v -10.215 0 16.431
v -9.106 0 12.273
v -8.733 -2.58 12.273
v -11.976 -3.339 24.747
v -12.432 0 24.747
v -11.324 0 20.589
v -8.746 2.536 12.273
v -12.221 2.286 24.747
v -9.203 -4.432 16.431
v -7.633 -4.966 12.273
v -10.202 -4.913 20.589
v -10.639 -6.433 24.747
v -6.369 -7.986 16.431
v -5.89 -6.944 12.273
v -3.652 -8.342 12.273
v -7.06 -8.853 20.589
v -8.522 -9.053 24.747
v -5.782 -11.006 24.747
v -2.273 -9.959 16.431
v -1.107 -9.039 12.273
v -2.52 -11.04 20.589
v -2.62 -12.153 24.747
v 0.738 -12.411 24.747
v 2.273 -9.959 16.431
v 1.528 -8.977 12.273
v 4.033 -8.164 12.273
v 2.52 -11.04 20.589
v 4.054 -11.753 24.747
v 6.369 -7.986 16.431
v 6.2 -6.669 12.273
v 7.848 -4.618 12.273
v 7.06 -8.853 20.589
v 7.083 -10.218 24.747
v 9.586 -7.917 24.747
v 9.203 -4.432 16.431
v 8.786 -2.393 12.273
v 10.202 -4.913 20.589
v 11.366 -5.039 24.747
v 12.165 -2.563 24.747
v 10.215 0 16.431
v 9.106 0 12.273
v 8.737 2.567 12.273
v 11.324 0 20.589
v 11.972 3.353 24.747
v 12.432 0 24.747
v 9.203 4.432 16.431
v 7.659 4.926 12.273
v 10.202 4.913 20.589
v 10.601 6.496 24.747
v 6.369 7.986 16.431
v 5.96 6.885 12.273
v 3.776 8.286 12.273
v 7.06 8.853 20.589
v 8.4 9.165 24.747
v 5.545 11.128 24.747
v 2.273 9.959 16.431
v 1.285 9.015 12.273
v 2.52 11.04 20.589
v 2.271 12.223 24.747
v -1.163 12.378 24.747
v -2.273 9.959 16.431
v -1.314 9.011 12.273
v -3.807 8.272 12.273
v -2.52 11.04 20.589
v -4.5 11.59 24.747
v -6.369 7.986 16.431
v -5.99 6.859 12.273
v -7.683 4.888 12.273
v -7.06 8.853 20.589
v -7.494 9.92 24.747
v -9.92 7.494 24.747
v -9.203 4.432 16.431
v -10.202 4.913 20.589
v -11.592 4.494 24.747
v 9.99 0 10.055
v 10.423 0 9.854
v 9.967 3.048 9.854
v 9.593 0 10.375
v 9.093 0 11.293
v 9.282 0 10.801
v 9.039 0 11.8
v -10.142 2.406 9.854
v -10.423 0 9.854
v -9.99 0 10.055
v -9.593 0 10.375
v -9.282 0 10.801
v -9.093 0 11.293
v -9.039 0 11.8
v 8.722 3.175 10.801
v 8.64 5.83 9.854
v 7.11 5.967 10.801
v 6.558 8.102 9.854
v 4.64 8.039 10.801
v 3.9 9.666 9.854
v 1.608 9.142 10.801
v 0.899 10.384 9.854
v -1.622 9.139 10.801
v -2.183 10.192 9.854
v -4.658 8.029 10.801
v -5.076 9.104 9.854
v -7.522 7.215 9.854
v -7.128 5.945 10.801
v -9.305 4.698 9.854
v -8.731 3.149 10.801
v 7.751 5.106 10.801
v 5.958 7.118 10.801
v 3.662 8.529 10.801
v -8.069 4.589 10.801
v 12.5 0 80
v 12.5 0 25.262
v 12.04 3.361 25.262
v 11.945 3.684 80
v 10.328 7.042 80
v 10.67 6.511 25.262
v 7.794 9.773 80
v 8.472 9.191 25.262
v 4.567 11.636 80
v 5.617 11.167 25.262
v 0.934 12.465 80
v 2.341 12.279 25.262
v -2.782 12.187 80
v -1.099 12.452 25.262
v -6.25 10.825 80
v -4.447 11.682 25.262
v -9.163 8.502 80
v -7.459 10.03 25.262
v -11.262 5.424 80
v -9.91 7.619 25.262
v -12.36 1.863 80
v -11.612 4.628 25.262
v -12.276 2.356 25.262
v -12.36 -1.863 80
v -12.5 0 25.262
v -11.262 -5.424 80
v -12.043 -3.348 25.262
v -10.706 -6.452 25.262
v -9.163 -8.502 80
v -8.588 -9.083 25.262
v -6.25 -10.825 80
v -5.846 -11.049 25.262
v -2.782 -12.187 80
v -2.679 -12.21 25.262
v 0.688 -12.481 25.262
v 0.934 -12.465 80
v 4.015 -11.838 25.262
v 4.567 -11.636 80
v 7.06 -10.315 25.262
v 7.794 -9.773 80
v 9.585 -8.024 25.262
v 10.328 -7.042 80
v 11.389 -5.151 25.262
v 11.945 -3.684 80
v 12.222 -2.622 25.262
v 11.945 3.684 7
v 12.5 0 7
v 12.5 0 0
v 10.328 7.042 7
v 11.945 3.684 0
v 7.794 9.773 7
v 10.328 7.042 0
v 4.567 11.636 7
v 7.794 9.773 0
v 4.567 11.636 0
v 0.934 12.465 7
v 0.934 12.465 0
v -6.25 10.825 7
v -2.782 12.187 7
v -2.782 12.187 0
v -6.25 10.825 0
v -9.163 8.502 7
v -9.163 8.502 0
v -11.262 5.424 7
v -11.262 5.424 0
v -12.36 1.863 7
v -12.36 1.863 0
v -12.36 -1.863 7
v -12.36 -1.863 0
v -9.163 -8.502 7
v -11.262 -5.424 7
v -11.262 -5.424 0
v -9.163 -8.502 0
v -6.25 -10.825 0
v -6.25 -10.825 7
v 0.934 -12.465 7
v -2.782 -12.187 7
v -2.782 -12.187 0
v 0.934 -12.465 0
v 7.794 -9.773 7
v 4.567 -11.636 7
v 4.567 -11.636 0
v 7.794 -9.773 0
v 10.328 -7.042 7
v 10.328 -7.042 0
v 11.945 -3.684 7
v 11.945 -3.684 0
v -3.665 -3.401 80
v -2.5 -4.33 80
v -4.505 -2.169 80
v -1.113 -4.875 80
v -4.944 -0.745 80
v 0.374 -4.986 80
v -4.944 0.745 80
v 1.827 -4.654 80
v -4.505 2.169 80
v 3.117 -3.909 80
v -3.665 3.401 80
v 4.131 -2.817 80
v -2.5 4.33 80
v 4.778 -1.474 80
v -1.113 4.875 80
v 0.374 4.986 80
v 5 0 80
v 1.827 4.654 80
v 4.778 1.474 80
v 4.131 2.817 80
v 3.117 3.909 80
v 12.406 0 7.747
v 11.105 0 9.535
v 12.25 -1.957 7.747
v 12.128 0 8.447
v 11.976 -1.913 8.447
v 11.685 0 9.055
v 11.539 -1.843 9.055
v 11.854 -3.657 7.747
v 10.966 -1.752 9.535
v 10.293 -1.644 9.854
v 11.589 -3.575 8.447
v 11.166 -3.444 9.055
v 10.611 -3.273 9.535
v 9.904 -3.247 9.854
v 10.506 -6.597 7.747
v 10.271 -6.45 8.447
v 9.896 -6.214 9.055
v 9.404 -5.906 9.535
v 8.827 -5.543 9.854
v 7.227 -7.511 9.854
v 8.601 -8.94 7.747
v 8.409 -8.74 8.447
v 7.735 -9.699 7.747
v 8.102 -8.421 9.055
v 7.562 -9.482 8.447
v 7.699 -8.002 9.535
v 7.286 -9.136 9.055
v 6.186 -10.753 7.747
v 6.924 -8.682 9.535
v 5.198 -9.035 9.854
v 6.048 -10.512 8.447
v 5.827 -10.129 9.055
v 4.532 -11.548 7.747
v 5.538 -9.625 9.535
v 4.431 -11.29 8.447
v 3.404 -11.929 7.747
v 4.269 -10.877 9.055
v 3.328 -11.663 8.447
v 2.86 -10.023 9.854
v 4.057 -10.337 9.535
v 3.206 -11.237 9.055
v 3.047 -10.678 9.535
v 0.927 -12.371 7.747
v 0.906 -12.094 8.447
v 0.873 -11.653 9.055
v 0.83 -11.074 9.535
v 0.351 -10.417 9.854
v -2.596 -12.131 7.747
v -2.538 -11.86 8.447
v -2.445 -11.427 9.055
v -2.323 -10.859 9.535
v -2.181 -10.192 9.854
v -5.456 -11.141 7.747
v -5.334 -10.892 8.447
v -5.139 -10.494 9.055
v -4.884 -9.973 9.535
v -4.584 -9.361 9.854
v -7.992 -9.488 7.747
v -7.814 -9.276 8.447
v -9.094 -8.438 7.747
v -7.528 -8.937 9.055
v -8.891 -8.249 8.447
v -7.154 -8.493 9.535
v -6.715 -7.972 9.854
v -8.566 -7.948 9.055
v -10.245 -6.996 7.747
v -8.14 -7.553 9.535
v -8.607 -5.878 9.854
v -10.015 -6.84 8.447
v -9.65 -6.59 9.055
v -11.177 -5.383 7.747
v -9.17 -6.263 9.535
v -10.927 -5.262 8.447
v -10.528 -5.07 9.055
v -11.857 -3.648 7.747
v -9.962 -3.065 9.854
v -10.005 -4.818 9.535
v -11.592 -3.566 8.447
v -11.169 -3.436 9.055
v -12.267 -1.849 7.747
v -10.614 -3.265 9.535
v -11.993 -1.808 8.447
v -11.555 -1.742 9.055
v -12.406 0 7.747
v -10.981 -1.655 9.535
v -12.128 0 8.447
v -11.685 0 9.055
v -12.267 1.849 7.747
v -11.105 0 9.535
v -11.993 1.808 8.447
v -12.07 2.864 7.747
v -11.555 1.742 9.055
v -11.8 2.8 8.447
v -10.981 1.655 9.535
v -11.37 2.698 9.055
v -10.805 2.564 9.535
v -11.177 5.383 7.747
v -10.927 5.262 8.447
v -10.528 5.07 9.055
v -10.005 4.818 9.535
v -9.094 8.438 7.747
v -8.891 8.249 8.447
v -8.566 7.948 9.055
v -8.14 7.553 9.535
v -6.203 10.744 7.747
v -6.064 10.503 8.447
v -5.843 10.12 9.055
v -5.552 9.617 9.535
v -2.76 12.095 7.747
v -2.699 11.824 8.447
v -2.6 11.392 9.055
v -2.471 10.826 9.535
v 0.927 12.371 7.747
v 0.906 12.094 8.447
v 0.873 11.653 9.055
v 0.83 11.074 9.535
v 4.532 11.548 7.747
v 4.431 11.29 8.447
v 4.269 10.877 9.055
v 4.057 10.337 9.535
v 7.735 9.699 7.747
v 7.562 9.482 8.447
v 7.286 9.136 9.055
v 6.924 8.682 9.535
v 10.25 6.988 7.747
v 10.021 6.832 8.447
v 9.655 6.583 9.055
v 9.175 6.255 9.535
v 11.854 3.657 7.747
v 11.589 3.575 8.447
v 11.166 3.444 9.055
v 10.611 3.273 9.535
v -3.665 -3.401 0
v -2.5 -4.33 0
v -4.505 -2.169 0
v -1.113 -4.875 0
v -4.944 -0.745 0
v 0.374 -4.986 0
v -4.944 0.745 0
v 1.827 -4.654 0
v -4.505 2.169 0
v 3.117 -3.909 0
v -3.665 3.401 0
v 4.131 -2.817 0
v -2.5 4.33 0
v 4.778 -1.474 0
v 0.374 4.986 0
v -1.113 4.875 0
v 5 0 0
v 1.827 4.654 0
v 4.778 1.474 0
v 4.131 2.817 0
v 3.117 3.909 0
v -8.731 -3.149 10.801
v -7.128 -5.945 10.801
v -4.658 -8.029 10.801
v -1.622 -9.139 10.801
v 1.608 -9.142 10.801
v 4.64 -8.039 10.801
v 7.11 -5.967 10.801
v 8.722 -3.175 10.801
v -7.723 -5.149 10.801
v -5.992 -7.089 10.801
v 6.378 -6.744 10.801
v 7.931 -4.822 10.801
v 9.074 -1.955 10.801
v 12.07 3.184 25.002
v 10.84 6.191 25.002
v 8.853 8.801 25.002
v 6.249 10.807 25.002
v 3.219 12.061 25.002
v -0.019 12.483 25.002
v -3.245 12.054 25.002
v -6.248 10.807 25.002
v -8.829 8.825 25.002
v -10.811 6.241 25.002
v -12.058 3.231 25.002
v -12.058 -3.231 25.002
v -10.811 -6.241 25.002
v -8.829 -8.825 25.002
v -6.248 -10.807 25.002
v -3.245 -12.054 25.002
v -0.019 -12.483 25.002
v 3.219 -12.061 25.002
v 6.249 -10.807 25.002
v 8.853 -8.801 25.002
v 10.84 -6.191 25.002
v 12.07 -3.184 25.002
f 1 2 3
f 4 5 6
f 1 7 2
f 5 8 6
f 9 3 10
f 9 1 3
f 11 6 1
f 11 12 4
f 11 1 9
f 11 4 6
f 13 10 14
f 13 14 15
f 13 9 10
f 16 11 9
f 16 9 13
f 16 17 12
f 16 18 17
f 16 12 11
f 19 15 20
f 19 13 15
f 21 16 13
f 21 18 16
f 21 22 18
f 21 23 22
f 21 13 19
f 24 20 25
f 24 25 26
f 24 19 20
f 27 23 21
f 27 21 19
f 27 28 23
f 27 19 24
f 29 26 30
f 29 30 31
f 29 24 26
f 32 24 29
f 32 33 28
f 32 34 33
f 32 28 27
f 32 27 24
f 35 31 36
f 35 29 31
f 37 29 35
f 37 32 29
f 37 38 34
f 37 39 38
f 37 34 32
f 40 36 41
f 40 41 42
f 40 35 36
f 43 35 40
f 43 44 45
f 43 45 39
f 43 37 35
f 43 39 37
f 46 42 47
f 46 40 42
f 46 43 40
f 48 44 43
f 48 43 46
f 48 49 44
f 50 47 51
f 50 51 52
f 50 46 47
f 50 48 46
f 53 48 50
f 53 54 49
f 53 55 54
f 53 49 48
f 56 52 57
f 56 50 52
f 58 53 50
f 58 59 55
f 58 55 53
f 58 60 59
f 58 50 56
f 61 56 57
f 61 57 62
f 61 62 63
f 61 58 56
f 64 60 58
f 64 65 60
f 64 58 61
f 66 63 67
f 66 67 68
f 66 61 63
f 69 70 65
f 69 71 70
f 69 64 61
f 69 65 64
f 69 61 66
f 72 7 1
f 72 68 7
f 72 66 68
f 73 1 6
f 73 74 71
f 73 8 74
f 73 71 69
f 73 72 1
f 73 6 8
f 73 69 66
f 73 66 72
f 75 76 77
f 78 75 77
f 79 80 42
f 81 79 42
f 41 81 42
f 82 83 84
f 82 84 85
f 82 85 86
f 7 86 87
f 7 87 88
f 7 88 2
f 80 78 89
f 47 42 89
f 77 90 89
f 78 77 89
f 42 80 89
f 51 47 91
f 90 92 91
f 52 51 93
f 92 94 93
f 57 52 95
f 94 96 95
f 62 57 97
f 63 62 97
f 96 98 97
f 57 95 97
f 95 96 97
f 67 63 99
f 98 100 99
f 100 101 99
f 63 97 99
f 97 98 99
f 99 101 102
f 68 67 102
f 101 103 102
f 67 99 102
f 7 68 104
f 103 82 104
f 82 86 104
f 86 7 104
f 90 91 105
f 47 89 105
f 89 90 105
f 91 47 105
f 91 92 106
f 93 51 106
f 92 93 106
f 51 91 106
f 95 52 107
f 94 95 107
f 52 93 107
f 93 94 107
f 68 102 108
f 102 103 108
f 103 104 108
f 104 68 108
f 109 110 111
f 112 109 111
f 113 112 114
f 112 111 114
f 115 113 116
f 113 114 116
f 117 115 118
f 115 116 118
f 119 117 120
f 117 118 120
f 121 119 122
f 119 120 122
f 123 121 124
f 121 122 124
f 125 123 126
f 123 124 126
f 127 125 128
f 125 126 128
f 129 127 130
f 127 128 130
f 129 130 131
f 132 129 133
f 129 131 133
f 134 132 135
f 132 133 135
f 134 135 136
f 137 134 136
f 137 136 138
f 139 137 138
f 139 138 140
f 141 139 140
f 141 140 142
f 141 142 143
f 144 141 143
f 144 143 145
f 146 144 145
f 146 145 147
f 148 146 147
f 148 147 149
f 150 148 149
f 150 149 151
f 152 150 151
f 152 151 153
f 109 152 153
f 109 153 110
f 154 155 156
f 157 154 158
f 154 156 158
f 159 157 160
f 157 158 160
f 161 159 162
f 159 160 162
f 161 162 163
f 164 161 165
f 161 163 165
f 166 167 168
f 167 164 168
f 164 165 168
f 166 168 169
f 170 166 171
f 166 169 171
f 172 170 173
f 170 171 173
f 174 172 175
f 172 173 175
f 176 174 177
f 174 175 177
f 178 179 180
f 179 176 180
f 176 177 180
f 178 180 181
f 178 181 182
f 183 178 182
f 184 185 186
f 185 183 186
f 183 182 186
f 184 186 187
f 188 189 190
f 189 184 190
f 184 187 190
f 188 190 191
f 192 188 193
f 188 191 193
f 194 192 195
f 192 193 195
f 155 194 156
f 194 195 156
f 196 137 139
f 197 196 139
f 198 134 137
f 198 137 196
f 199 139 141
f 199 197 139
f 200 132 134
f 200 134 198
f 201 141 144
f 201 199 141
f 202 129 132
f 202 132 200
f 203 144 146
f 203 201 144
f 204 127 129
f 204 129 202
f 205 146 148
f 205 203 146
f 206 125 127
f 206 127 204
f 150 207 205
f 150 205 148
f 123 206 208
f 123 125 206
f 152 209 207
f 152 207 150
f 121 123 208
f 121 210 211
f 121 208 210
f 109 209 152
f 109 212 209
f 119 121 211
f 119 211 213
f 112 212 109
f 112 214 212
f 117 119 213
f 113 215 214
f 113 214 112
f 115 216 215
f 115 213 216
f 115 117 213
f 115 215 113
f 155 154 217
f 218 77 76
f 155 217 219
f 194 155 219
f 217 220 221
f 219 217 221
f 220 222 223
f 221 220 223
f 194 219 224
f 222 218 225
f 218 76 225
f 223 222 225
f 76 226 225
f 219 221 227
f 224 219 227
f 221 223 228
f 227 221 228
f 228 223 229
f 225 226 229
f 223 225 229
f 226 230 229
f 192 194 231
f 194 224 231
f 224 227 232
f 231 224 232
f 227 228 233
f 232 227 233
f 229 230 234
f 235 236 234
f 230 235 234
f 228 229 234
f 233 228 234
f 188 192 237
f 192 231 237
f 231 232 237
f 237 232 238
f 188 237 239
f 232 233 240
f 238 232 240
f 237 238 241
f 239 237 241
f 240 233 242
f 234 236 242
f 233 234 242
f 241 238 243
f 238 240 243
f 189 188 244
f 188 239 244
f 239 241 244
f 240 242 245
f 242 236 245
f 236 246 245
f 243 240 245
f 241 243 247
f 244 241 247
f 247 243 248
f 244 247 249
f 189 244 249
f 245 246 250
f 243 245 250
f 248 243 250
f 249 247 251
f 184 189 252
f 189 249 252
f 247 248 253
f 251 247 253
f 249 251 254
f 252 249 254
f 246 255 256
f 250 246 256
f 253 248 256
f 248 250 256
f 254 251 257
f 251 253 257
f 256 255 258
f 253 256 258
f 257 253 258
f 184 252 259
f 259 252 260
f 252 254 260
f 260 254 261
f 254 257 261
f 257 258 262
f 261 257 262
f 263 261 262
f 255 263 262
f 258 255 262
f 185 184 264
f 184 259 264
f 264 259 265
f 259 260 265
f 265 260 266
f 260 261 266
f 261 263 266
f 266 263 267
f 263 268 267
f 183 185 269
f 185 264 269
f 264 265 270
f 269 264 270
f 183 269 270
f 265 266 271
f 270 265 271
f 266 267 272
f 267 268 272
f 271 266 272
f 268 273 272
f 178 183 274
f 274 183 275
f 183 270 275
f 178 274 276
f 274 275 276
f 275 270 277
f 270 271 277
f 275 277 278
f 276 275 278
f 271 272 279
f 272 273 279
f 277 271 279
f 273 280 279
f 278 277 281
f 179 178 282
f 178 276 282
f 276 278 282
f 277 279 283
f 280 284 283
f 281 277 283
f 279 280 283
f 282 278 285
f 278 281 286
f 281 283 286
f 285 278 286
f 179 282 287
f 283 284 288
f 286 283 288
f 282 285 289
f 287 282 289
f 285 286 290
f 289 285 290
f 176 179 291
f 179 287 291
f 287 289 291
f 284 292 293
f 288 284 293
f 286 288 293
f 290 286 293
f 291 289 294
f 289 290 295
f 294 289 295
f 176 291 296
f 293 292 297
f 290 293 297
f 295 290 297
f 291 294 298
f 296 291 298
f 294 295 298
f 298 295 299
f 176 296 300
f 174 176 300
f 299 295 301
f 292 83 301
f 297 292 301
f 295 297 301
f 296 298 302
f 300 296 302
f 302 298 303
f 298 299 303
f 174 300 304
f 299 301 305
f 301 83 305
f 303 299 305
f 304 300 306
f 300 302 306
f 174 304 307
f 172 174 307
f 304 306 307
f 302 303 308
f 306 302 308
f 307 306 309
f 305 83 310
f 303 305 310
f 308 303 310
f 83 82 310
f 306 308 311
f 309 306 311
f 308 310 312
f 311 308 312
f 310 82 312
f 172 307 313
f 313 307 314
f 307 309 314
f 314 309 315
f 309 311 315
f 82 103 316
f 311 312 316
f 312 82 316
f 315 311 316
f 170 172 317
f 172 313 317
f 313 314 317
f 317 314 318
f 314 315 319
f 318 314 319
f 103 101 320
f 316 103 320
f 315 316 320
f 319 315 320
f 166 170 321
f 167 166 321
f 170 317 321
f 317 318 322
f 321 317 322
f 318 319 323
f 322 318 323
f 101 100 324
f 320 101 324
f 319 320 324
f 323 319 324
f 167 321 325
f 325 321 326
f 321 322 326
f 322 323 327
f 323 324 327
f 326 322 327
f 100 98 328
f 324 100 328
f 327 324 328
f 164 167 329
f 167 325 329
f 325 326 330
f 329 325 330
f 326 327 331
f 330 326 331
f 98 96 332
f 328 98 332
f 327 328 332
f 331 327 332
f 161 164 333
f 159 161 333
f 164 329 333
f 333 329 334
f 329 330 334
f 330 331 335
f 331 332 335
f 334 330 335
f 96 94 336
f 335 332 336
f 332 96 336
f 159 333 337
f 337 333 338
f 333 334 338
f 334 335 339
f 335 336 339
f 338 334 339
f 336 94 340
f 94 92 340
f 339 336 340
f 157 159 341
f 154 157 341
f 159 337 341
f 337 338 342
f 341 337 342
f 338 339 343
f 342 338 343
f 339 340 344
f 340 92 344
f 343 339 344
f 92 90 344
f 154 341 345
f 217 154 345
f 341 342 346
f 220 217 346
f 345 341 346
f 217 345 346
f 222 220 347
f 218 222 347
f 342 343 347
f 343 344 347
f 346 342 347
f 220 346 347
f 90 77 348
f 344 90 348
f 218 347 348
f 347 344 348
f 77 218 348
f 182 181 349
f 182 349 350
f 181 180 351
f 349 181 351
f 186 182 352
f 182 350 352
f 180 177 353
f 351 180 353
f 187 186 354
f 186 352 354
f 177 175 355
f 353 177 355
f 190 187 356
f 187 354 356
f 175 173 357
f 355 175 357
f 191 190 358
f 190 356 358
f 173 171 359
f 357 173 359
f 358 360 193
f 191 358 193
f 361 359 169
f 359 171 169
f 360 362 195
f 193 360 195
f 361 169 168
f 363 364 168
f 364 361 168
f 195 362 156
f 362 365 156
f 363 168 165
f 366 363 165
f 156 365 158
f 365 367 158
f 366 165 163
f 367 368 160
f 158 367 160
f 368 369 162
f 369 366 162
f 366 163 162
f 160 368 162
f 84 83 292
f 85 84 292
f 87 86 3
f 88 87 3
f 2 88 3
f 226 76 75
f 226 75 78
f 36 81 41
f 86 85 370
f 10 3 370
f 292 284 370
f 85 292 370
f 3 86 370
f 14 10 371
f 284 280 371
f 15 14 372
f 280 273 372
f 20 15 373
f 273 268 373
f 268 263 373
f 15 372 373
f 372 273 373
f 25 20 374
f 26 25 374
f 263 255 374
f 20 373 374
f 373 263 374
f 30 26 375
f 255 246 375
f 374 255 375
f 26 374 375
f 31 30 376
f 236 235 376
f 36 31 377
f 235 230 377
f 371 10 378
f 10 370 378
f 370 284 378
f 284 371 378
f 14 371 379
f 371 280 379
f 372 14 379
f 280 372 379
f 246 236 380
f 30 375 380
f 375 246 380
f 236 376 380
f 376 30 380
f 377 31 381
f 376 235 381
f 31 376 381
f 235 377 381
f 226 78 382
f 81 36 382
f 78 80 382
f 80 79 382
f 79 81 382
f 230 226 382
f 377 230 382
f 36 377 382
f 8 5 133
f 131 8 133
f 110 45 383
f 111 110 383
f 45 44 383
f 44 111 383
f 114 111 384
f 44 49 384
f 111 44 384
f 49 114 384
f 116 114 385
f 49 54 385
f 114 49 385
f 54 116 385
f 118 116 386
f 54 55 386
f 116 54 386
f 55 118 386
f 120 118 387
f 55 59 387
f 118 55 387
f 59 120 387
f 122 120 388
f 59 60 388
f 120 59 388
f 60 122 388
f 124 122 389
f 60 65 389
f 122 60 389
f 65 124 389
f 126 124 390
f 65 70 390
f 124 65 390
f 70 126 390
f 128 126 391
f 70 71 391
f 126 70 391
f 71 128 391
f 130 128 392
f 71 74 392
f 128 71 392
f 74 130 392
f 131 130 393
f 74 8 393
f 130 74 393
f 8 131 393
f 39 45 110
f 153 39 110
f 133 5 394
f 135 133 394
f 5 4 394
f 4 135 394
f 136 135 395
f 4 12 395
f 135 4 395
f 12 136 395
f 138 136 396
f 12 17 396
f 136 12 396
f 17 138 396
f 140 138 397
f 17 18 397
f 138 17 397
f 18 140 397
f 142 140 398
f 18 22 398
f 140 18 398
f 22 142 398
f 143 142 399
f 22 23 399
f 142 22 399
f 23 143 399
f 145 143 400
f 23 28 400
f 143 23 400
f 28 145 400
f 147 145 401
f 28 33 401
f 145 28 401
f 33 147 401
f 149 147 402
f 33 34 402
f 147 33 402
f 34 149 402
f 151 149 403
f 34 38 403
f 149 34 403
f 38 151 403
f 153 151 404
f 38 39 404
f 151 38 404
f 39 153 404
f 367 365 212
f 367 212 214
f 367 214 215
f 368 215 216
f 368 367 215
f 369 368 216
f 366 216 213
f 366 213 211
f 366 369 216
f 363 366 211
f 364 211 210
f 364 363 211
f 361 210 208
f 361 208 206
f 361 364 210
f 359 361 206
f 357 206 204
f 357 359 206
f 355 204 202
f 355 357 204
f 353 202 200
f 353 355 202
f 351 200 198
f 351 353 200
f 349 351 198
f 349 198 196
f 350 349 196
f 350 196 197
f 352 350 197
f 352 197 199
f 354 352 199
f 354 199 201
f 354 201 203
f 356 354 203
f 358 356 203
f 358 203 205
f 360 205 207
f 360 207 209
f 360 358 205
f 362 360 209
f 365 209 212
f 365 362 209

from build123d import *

# Parameters (mm, degrees)
SKETCH_1_R      = 12.5
SKETCH_1_R_2    = 5
EXTRUDE_1_DEPTH = 80
FILLET_1_R      = 3
FILLET_2_R      = 2
FILLET_3_R      = 2


with BuildPart() as part:
    # Эскиз1 → Вытянуть-Тонкостенный1 (new body)
    with BuildSketch(Plane.XY):
        Circle(SKETCH_1_R)
        Circle(SKETCH_1_R_2, mode=Mode.SUBTRACT)
    extrude(amount=EXTRUDE_1_DEPTH)

    # Эскиз2 → Вырез-Повернуть1 (revolve, cut)
    with BuildSketch(Plane(origin=(0, 0, 0), x_dir=(1, 0, 0), z_dir=(0, 1, 0)), mode=Mode.PRIVATE) as cut_revolve_1_sk:
        Polygon((12.5, -10), (8.5, -10), (12.5, -25), align=None)
    revolve(cut_revolve_1_sk.sketch.rotate(Axis((0, 0, -6.599641281), (0, 0, 1)), 180), axis=Axis((0, 0, -6.599641281), (0, 0, 1)), mode=Mode.SUBTRACT)

    # Скругление1
    fillet_1_edges = [part.edges().sort_by_distance(p)[0] for p in [
        (-12.5, 0, 10),
    ]]
    fillet(fillet_1_edges, radius=FILLET_1_R)

    # Скругление2
    fillet_2_edges = [part.edges().sort_by_distance(p)[0] for p in [
        (8.5, 0, 10),
    ]]
    fillet(fillet_2_edges, radius=FILLET_2_R)

    # Скругление3
    fillet_3_edges = [part.edges().sort_by_distance(p)[0] for p in [
        (0, -12.5, 25),
    ]]
    fillet(fillet_3_edges, radius=FILLET_3_R)


solid = part.part
